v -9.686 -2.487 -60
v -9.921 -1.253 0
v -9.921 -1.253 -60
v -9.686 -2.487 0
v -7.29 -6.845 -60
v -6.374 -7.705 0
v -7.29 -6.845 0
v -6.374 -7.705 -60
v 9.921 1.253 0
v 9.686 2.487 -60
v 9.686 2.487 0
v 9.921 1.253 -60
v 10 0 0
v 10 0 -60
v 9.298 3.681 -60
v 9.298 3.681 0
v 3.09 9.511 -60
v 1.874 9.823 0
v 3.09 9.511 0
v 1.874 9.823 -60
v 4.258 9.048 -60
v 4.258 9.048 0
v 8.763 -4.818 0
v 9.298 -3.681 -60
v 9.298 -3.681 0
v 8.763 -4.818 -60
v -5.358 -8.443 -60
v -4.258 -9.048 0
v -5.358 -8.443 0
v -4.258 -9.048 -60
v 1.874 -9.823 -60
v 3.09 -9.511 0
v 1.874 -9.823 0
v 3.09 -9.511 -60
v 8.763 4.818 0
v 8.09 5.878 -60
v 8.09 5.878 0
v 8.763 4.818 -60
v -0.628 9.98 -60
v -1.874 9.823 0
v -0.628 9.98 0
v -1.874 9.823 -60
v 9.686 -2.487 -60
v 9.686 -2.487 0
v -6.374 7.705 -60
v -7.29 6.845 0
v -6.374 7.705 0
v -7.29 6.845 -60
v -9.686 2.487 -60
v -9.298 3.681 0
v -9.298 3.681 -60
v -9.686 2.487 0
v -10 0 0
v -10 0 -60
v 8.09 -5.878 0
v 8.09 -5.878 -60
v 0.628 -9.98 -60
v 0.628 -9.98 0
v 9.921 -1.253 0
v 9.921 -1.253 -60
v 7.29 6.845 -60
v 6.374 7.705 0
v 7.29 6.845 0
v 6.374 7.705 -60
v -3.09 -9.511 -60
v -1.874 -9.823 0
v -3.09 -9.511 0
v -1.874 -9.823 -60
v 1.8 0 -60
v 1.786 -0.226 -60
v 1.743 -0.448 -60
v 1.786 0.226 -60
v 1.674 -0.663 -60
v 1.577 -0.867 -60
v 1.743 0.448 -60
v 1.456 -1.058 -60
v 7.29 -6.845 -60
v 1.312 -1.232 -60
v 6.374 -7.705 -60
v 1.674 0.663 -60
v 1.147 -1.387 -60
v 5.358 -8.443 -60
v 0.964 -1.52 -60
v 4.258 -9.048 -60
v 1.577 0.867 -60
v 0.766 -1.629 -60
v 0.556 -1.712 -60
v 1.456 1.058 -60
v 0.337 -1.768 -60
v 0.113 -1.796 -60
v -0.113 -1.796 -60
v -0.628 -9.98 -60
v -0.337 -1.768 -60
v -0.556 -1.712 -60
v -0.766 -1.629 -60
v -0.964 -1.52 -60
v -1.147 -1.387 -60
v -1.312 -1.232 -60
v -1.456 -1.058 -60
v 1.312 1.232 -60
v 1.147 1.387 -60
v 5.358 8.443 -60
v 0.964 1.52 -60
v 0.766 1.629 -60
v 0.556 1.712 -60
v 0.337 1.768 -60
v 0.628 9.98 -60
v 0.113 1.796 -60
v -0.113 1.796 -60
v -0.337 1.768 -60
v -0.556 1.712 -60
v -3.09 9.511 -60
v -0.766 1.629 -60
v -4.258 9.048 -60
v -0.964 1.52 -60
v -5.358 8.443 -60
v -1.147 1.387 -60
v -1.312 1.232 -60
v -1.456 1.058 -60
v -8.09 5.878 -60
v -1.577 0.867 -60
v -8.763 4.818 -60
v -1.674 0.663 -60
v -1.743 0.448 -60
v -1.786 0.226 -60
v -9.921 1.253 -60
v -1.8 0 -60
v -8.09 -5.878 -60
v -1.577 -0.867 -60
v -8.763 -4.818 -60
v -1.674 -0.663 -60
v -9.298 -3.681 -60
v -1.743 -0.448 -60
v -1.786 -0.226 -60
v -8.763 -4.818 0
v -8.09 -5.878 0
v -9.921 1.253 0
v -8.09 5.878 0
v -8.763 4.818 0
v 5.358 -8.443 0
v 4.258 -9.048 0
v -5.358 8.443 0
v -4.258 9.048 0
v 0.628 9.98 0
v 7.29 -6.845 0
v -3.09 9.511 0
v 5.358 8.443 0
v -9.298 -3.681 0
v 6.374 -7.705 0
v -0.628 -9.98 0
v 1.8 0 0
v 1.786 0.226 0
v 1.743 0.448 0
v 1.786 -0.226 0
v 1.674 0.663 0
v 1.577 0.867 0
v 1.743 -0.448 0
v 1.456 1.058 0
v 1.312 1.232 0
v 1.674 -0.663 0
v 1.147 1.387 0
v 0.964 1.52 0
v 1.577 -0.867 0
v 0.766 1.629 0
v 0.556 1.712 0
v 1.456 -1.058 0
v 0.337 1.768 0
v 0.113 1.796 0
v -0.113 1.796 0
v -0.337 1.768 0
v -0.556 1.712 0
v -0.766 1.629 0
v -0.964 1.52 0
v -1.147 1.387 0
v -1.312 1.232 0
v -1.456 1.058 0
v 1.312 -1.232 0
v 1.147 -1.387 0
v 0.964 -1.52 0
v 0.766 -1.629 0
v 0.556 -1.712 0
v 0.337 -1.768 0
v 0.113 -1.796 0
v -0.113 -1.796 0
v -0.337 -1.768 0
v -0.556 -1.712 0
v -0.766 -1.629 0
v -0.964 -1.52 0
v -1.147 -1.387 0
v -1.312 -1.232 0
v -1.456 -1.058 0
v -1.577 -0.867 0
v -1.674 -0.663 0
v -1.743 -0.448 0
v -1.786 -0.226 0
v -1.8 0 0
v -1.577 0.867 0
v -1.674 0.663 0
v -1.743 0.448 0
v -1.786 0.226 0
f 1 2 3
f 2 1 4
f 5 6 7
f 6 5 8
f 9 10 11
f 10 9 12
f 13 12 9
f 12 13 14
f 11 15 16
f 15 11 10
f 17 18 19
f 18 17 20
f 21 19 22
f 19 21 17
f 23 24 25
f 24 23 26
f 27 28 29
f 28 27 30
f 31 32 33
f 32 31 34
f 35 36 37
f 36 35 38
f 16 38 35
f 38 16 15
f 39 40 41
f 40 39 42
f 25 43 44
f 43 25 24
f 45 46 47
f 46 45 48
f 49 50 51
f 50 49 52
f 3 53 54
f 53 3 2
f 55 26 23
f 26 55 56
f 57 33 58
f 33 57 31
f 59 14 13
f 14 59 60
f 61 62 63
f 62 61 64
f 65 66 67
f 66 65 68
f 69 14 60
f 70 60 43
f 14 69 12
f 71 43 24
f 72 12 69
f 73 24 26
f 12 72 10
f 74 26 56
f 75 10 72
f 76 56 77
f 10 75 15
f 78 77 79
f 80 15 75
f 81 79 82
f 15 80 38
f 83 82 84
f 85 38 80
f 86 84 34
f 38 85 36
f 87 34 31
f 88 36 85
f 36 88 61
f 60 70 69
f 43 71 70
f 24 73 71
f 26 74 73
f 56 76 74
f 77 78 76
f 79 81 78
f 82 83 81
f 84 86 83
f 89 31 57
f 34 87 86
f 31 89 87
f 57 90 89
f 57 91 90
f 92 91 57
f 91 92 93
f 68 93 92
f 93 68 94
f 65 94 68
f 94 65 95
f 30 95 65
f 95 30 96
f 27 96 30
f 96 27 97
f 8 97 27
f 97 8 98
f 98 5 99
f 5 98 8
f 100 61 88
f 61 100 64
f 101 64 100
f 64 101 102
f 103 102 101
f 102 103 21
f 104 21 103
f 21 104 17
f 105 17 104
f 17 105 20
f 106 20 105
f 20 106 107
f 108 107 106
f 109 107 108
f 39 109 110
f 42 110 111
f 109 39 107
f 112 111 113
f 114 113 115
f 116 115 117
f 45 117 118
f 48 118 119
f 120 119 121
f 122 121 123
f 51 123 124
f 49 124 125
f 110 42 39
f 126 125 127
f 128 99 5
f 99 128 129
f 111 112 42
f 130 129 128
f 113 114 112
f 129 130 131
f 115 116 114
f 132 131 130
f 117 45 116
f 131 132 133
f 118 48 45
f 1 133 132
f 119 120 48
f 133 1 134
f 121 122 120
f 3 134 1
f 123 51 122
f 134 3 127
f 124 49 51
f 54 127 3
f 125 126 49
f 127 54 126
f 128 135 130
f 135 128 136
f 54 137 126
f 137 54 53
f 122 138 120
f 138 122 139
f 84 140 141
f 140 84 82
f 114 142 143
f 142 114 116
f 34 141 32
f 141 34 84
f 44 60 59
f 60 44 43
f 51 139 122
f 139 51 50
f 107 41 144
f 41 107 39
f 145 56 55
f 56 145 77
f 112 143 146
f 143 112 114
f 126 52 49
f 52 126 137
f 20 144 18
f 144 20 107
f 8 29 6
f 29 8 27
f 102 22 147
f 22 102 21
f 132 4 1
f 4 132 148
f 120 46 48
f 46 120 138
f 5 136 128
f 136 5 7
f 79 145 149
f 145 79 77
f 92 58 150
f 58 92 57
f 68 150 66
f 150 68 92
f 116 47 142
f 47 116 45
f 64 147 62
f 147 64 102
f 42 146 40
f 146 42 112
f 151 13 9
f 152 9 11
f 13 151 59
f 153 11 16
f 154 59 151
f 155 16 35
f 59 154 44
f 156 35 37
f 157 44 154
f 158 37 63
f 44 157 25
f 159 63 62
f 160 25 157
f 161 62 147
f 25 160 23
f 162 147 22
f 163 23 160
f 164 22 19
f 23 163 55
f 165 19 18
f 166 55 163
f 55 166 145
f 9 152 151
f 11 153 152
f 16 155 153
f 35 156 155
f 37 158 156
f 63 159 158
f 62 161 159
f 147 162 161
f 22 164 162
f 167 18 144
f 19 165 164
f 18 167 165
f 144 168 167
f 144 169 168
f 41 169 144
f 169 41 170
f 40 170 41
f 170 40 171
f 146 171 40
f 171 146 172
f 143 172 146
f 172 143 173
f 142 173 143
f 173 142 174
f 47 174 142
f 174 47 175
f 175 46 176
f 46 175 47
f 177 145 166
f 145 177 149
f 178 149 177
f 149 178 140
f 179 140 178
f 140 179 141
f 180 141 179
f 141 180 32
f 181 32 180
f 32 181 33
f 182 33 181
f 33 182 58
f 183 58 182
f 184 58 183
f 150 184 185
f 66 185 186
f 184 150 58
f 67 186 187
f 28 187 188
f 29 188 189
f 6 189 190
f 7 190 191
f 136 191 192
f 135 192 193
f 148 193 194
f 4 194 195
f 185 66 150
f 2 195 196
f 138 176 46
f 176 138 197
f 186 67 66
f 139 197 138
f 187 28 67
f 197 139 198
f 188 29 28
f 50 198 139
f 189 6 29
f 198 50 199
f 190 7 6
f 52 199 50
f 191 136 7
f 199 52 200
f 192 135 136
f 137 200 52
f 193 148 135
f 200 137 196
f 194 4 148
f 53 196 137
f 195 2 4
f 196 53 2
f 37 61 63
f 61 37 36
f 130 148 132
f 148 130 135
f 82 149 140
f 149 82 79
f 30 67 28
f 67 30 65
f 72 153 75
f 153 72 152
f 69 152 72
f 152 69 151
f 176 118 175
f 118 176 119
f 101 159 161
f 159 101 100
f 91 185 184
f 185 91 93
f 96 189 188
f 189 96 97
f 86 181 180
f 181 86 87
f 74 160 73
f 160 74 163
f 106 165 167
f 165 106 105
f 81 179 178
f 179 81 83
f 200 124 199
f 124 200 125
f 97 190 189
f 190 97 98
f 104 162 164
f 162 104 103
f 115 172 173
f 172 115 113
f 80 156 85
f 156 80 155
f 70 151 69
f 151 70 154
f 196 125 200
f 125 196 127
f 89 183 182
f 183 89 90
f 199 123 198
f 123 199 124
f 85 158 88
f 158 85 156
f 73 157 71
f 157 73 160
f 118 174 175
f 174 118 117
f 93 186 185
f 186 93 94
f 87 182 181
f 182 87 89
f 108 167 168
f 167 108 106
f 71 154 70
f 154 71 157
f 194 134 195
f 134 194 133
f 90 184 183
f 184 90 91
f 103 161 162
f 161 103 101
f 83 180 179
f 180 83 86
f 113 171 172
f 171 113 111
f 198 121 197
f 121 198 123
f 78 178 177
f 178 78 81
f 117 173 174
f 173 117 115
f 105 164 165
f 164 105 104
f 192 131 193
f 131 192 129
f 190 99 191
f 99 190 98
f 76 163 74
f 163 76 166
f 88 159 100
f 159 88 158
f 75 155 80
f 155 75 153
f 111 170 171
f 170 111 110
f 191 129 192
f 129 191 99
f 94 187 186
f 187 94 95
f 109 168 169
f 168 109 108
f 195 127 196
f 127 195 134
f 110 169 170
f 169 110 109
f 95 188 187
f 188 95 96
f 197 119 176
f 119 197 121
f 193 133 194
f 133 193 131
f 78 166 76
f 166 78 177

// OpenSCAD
$fn = 50;


difference() {
	union() {
		translate(v = [0, 0, -60.0000000000]) {
			cylinder(h = 60, r = 10.0000000000);
		}
		cylinder(h = 0, r = 13.0000000000);
	}
	union() {
		#translate(v = [0, 0, -60]) {
			cylinder(h = 60, r = 1.8000000000);
		}
	}
}
